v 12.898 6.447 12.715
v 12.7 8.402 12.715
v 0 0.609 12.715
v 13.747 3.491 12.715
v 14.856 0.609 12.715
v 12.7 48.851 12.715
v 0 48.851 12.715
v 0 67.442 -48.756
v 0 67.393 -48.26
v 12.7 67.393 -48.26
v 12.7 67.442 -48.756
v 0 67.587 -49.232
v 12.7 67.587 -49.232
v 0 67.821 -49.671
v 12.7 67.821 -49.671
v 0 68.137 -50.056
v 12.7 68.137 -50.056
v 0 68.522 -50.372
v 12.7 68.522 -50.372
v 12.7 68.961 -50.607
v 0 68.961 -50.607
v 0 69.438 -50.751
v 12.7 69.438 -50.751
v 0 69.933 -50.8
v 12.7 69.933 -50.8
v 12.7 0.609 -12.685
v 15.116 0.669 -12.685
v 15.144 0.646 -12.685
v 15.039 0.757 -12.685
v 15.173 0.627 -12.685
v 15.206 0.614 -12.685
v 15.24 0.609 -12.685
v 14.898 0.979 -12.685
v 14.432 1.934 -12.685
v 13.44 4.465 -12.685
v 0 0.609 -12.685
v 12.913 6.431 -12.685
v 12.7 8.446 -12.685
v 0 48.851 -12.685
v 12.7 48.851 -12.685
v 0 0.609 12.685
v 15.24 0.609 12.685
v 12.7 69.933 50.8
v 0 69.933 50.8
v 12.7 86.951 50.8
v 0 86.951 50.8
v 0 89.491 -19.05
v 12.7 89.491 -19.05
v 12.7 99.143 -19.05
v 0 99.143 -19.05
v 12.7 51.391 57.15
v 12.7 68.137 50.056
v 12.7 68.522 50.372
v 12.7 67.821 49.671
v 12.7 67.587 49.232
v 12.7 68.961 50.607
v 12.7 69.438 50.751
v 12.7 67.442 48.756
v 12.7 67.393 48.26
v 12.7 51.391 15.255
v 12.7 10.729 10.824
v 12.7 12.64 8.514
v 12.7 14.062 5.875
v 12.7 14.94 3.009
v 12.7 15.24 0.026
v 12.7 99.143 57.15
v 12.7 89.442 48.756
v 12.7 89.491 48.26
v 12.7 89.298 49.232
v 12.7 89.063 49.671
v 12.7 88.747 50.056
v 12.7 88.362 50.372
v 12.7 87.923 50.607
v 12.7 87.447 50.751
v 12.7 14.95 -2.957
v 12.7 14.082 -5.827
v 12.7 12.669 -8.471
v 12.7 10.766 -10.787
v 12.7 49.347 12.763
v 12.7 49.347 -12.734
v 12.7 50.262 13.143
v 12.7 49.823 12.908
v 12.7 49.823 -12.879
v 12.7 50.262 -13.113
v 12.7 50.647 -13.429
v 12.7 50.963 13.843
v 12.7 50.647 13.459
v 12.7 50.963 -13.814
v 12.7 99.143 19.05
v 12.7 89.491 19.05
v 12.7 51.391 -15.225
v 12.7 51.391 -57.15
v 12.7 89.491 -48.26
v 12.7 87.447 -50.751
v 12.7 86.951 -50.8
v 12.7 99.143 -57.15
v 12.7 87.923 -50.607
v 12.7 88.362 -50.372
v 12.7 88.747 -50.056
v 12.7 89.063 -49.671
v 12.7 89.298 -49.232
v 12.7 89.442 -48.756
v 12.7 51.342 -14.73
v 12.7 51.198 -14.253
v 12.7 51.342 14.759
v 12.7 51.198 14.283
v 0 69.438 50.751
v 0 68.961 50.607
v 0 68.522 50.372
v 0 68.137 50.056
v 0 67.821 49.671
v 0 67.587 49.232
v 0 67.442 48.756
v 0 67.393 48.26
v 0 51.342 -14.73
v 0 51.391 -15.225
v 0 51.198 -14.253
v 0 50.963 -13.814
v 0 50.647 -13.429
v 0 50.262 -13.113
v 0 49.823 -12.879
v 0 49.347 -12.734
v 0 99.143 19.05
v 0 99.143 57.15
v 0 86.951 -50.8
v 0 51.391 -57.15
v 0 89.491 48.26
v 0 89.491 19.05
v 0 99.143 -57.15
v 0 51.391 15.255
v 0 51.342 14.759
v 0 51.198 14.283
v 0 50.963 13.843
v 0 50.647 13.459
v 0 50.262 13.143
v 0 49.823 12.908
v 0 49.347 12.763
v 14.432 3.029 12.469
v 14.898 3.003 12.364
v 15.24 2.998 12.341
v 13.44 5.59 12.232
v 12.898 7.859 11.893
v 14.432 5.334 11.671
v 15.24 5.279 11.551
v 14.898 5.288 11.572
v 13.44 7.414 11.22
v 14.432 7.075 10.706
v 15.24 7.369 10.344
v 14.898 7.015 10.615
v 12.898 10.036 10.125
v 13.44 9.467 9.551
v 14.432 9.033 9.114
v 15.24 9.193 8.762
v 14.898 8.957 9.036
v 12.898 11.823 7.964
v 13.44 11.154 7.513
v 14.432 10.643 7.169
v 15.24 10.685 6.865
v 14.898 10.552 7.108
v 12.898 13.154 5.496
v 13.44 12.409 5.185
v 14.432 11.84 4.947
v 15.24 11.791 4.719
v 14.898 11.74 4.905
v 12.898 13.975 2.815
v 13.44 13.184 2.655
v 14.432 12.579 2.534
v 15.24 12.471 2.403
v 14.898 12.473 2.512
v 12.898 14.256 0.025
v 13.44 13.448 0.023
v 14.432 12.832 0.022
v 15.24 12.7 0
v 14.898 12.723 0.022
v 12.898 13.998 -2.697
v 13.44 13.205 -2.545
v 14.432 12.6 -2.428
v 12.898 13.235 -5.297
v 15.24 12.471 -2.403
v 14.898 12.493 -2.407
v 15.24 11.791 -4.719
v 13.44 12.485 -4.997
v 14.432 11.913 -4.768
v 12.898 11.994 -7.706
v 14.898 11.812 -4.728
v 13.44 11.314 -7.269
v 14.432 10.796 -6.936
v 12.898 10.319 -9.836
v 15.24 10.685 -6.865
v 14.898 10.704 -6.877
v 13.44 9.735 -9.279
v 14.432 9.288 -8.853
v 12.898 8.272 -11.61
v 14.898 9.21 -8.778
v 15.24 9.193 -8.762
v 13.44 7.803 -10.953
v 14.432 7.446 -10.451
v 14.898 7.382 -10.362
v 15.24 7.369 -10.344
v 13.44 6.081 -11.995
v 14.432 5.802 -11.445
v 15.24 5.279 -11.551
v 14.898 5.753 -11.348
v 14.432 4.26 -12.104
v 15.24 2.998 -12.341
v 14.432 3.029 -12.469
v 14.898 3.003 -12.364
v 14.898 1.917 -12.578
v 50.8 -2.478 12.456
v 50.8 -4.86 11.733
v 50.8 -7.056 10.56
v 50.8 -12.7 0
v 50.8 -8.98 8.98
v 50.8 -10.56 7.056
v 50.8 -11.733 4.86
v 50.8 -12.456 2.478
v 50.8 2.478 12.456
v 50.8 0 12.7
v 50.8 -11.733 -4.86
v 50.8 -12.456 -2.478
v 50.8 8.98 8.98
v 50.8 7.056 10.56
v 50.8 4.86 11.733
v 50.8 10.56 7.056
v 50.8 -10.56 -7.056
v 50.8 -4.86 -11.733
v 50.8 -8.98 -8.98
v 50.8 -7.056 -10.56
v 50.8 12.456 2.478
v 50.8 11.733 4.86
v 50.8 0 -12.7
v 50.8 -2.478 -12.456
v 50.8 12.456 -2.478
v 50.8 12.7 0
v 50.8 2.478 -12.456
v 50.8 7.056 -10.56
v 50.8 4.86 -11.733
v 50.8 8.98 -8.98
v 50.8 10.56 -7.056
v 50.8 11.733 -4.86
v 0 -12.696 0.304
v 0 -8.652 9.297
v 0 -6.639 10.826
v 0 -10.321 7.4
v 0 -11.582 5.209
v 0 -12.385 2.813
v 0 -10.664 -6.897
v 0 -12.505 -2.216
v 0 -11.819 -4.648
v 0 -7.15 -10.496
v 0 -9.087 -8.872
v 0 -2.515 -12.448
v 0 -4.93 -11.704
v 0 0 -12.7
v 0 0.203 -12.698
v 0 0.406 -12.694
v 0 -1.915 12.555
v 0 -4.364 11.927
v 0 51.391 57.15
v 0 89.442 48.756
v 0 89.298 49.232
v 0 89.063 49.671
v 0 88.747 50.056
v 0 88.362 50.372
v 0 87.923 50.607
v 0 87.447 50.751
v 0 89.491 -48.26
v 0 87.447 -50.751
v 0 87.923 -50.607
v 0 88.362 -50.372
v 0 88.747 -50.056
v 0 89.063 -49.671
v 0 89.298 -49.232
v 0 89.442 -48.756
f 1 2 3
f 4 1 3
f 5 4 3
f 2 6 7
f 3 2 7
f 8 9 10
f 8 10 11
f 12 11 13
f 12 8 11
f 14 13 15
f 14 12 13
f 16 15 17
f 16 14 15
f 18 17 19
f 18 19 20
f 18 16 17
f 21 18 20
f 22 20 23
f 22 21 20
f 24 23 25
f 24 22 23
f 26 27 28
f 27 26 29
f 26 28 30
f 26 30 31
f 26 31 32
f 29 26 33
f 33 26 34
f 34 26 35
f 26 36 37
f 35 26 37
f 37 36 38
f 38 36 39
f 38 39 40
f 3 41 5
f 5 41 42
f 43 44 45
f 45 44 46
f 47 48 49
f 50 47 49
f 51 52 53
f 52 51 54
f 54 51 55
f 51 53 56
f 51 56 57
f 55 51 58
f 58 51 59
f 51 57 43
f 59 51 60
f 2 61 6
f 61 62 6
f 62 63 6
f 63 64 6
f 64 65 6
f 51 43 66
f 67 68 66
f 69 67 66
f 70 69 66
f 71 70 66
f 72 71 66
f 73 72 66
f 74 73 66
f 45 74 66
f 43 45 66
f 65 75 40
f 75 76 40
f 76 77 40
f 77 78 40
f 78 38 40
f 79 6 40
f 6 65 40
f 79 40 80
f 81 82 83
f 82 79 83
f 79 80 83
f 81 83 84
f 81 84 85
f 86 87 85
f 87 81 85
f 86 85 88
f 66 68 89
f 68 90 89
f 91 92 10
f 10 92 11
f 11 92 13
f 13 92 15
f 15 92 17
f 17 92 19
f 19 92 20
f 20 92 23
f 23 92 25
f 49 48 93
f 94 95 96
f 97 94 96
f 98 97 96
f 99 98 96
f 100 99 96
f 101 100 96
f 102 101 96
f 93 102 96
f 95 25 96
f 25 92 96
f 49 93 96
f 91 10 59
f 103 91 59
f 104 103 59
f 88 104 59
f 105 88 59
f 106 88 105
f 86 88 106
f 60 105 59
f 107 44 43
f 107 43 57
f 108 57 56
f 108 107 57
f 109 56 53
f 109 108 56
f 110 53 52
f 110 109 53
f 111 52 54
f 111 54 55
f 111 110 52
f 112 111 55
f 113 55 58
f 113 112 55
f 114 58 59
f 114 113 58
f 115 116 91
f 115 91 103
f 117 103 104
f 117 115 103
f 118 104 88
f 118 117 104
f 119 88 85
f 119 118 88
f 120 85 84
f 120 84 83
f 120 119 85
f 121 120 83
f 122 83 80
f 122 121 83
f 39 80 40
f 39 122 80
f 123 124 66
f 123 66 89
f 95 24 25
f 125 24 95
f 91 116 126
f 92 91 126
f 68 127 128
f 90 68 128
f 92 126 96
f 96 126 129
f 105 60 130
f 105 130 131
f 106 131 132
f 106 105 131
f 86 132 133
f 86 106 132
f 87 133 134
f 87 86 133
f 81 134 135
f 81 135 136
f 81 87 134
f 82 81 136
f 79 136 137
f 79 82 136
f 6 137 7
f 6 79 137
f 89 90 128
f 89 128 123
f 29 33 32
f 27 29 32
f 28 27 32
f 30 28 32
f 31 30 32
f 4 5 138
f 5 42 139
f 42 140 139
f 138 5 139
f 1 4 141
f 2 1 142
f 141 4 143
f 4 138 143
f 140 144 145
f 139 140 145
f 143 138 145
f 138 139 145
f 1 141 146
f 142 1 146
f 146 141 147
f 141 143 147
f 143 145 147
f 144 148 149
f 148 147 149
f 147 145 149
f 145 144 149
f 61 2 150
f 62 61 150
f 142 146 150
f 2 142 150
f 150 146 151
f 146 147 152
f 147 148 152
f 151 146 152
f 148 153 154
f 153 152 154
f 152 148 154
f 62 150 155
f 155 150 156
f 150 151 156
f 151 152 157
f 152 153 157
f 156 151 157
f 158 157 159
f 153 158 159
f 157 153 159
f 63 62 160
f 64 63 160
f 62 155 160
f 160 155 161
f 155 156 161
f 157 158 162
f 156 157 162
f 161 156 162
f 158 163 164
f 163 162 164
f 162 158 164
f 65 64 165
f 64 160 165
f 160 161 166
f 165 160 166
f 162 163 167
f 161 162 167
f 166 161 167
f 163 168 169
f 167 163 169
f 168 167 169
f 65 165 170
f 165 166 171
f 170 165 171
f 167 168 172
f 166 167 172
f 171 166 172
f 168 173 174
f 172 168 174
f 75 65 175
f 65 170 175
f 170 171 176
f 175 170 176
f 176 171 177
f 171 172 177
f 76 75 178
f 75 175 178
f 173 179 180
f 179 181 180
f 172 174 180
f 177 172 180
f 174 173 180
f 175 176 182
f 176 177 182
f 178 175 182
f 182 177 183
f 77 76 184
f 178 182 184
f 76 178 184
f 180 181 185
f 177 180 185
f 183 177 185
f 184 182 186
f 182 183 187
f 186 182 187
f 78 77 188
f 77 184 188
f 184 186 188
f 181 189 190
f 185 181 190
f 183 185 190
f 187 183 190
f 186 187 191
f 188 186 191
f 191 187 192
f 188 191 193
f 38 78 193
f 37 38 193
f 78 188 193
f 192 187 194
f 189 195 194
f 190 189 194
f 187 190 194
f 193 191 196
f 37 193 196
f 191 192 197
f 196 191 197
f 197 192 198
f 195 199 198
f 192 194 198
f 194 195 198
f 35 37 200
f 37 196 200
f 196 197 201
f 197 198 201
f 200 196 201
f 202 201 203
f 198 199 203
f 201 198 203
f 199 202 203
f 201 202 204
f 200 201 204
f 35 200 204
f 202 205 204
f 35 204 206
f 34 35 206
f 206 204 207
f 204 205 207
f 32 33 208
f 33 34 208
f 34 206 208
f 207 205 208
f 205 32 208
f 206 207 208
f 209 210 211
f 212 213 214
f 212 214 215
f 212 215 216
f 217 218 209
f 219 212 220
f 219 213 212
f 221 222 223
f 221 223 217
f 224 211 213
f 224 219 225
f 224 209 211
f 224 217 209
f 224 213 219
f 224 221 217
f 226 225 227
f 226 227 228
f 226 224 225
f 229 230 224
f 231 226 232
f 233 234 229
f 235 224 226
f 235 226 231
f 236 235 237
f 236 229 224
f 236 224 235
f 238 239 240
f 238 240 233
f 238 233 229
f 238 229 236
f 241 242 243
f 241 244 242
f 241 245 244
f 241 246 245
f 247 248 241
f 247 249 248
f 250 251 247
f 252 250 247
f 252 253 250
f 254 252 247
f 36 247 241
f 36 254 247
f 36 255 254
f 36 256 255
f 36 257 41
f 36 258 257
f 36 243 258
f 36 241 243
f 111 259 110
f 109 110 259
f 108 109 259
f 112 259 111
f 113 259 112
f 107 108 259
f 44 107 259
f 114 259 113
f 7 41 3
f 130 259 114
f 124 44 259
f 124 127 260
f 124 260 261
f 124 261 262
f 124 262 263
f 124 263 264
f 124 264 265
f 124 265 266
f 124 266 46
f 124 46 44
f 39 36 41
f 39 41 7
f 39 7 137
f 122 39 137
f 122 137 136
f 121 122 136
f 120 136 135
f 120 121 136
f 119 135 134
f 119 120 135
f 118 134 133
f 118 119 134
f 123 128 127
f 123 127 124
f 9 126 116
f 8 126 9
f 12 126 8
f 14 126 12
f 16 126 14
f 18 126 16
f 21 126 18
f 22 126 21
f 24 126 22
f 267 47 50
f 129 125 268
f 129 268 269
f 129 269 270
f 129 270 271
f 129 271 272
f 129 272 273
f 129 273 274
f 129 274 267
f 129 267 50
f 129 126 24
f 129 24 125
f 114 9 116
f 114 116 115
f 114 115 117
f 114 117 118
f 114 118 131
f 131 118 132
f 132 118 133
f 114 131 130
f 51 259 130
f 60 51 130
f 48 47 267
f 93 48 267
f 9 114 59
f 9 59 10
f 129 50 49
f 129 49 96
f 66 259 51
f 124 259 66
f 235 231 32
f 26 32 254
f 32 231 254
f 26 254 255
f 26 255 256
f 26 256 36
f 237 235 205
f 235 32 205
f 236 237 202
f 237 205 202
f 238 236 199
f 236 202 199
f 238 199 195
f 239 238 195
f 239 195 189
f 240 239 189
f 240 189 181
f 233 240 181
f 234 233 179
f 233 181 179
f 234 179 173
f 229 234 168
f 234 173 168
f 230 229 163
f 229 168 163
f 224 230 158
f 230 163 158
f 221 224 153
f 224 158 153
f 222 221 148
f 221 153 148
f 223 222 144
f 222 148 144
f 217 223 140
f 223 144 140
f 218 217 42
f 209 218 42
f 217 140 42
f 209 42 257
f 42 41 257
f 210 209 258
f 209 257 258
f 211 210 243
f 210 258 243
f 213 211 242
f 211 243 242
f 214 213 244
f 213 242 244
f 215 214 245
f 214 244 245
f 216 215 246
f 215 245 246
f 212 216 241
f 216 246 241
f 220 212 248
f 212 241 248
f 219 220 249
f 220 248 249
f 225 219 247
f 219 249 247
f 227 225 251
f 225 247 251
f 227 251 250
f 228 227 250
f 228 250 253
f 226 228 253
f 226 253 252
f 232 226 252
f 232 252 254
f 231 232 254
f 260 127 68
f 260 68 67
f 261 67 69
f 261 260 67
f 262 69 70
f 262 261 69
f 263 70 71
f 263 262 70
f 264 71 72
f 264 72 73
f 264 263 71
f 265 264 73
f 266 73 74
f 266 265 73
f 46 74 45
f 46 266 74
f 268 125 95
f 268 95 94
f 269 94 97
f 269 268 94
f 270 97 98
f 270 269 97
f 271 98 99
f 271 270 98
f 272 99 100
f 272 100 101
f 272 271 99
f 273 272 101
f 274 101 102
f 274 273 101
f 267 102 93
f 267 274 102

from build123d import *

# Parameters (mm, degrees)
SKETCH2_R           = 12.7
BOSS_EXTRUDE1_DEPTH = 50.8
SKETCH3_W           = 25.4
SKETCH3_H           = 50.8
BOSS_EXTRUDE2_DEPTH = 12.7
SKETCH5_W           = 101.6
SKETCH5_H           = 16.002
BOSS_EXTRUDE3_DEPTH = 12.7
SKETCH6_W           = 6.35
SKETCH6_H           = 38.1
BOSS_EXTRUDE4_DEPTH = 12.7
SKETCH7_W           = 38.1
SKETCH7_H           = 9.652
BOSS_EXTRUDE5_DEPTH = 12.7
FILLET1_R           = 2.54


with BuildPart() as part:
    # Sketch2 → Boss-Extrude1 (new body)
    with BuildSketch(Plane(origin=(0, 0, 0), x_dir=(0, 0, -1), z_dir=(1, 0, 0))):
        Circle(SKETCH2_R)
    extrude(amount=BOSS_EXTRUDE1_DEPTH)

    # Sketch3 → Boss-Extrude2 (add)
    with BuildSketch(Plane.ZY):
        with Locations((0.014597196, 26.008732875)):
            Rectangle(SKETCH3_W, SKETCH3_H)
    extrude(amount=-BOSS_EXTRUDE2_DEPTH)


with BuildPart() as body_2:
    # Sketch5 → Boss-Extrude3 (new body)
    with BuildSketch(Plane(origin=(0, 0, 0), x_dir=(0, 0, -1), z_dir=(1, 0, 0))):
        with Locations((0, 59.392294155)):
            Rectangle(SKETCH5_W, SKETCH5_H)
    extrude(amount=BOSS_EXTRUDE3_DEPTH)

    # Sketch6 → Boss-Extrude4 (add)
    with BuildSketch(Plane(origin=(0, 0, 0), x_dir=(0, 0, -1), z_dir=(1, 0, 0))):
        with Locations((-53.975, 70.441294155)):
            Rectangle(SKETCH6_W, SKETCH6_H)
        with Locations((53.975, 70.441294155)):
            Rectangle(SKETCH6_W, SKETCH6_H)
    extrude(amount=BOSS_EXTRUDE4_DEPTH)

    # Sketch7 → Boss-Extrude5 (add)
    with BuildSketch(Plane(origin=(0, 0, 0), x_dir=(0, 0, -1), z_dir=(1, 0, 0))):
        with Locations((-38.1, 94.317294155)):
            Rectangle(SKETCH7_W, SKETCH7_H)
        with Locations((38.1, 94.317294155)):
            Rectangle(SKETCH7_W, SKETCH7_H)
    extrude(amount=BOSS_EXTRUDE5_DEPTH)


with BuildPart() as part_1:
    add(part.part)

    # Combine1: union body 2
    add(body_2.part)

    # Fillet1
    # the kernel refuses this fillet: 2.54 mm, written as the material it adds along each edge
    with BuildSketch(Plane(origin=(12.7, 51.391294155, 12.714597196), x_dir=(0, -1, 0), z_dir=(-1, 0, 0)), Plane(origin=(0, 51.391294155, -12.685402804), x_dir=(0, -1, 0), z_dir=(1, 0, 0)), Plane(origin=(0, 67.393294155, -50.8), x_dir=(0, 1, 0), z_dir=(1, 0, 0))) as fillet1_piece_1:
        with BuildLine():
            CenterArc((FILLET1_R, FILLET1_R), FILLET1_R, 180, 90)
            Line((0, FILLET1_R), (0, 0))
            Line((0, 0), (FILLET1_R, 0))
        make_face()
    extrude(amount=12.7)
    with BuildSketch(Plane(origin=(12.7, 0, 0), x_dir=(0, -0.4374901189408423, 0.8992232180216032), z_dir=(0, -0.8992232180216032, -0.4374901189408423))) as fillet1_piece_2_section:
        with BuildLine():
            CenterArc((12.7 + FILLET1_R, -FILLET1_R), FILLET1_R, 90, 90)
            Line((12.7 + FILLET1_R, 0), (12.7, 0))
            Line((12.7, 0), (12.7, -FILLET1_R))
        make_face()
    fillet1_piece_2 = revolve(axis=Axis((12.7, 0, 0), (-1, 0, 0)), revolution_arc=231.887700359, mode=Mode.PRIVATE)
    fillet1_piece_2 = split(fillet1_piece_2, bisect_by=Plane(origin=(13.416714054, 13.416714034, -12.685402804), z_dir=(0, 0, 1)), keep=Keep.TOP, mode=Mode.PRIVATE)
    fillet1_piece_2 = split(fillet1_piece_2, bisect_by=Plane(origin=(13.416714054, 0.608732875, 0.00073746), z_dir=(0, 1, 0)), keep=Keep.TOP, mode=Mode.PRIVATE)
    fillet1_piece_2 = split(fillet1_piece_2, bisect_by=Plane(origin=(13.416714054, 13.416714034, 12.714597196), z_dir=(0, 0, -1)), keep=Keep.TOP, mode=Mode.PRIVATE)
    add(fillet1_piece_2)
    with BuildSketch(Plane(origin=(0, 89.491294155, -50.8), x_dir=(0, -1, 0), z_dir=(1, 0, 0)), Plane(origin=(0, 89.491294155, 50.8), x_dir=(0, 0, -1), z_dir=(1, 0, 0)), Plane(origin=(0, 67.393294155, 50.8), x_dir=(0, 1, 0), z_dir=(1, 0, 0))) as fillet1_piece_3:
        with BuildLine():
            CenterArc((FILLET1_R, -FILLET1_R), FILLET1_R, 90, 90)
            Line((0, -FILLET1_R), (0, 0))
            Line((0, 0), (FILLET1_R, 0))
        make_face()
    extrude(amount=12.7)


solid = part_1.part
